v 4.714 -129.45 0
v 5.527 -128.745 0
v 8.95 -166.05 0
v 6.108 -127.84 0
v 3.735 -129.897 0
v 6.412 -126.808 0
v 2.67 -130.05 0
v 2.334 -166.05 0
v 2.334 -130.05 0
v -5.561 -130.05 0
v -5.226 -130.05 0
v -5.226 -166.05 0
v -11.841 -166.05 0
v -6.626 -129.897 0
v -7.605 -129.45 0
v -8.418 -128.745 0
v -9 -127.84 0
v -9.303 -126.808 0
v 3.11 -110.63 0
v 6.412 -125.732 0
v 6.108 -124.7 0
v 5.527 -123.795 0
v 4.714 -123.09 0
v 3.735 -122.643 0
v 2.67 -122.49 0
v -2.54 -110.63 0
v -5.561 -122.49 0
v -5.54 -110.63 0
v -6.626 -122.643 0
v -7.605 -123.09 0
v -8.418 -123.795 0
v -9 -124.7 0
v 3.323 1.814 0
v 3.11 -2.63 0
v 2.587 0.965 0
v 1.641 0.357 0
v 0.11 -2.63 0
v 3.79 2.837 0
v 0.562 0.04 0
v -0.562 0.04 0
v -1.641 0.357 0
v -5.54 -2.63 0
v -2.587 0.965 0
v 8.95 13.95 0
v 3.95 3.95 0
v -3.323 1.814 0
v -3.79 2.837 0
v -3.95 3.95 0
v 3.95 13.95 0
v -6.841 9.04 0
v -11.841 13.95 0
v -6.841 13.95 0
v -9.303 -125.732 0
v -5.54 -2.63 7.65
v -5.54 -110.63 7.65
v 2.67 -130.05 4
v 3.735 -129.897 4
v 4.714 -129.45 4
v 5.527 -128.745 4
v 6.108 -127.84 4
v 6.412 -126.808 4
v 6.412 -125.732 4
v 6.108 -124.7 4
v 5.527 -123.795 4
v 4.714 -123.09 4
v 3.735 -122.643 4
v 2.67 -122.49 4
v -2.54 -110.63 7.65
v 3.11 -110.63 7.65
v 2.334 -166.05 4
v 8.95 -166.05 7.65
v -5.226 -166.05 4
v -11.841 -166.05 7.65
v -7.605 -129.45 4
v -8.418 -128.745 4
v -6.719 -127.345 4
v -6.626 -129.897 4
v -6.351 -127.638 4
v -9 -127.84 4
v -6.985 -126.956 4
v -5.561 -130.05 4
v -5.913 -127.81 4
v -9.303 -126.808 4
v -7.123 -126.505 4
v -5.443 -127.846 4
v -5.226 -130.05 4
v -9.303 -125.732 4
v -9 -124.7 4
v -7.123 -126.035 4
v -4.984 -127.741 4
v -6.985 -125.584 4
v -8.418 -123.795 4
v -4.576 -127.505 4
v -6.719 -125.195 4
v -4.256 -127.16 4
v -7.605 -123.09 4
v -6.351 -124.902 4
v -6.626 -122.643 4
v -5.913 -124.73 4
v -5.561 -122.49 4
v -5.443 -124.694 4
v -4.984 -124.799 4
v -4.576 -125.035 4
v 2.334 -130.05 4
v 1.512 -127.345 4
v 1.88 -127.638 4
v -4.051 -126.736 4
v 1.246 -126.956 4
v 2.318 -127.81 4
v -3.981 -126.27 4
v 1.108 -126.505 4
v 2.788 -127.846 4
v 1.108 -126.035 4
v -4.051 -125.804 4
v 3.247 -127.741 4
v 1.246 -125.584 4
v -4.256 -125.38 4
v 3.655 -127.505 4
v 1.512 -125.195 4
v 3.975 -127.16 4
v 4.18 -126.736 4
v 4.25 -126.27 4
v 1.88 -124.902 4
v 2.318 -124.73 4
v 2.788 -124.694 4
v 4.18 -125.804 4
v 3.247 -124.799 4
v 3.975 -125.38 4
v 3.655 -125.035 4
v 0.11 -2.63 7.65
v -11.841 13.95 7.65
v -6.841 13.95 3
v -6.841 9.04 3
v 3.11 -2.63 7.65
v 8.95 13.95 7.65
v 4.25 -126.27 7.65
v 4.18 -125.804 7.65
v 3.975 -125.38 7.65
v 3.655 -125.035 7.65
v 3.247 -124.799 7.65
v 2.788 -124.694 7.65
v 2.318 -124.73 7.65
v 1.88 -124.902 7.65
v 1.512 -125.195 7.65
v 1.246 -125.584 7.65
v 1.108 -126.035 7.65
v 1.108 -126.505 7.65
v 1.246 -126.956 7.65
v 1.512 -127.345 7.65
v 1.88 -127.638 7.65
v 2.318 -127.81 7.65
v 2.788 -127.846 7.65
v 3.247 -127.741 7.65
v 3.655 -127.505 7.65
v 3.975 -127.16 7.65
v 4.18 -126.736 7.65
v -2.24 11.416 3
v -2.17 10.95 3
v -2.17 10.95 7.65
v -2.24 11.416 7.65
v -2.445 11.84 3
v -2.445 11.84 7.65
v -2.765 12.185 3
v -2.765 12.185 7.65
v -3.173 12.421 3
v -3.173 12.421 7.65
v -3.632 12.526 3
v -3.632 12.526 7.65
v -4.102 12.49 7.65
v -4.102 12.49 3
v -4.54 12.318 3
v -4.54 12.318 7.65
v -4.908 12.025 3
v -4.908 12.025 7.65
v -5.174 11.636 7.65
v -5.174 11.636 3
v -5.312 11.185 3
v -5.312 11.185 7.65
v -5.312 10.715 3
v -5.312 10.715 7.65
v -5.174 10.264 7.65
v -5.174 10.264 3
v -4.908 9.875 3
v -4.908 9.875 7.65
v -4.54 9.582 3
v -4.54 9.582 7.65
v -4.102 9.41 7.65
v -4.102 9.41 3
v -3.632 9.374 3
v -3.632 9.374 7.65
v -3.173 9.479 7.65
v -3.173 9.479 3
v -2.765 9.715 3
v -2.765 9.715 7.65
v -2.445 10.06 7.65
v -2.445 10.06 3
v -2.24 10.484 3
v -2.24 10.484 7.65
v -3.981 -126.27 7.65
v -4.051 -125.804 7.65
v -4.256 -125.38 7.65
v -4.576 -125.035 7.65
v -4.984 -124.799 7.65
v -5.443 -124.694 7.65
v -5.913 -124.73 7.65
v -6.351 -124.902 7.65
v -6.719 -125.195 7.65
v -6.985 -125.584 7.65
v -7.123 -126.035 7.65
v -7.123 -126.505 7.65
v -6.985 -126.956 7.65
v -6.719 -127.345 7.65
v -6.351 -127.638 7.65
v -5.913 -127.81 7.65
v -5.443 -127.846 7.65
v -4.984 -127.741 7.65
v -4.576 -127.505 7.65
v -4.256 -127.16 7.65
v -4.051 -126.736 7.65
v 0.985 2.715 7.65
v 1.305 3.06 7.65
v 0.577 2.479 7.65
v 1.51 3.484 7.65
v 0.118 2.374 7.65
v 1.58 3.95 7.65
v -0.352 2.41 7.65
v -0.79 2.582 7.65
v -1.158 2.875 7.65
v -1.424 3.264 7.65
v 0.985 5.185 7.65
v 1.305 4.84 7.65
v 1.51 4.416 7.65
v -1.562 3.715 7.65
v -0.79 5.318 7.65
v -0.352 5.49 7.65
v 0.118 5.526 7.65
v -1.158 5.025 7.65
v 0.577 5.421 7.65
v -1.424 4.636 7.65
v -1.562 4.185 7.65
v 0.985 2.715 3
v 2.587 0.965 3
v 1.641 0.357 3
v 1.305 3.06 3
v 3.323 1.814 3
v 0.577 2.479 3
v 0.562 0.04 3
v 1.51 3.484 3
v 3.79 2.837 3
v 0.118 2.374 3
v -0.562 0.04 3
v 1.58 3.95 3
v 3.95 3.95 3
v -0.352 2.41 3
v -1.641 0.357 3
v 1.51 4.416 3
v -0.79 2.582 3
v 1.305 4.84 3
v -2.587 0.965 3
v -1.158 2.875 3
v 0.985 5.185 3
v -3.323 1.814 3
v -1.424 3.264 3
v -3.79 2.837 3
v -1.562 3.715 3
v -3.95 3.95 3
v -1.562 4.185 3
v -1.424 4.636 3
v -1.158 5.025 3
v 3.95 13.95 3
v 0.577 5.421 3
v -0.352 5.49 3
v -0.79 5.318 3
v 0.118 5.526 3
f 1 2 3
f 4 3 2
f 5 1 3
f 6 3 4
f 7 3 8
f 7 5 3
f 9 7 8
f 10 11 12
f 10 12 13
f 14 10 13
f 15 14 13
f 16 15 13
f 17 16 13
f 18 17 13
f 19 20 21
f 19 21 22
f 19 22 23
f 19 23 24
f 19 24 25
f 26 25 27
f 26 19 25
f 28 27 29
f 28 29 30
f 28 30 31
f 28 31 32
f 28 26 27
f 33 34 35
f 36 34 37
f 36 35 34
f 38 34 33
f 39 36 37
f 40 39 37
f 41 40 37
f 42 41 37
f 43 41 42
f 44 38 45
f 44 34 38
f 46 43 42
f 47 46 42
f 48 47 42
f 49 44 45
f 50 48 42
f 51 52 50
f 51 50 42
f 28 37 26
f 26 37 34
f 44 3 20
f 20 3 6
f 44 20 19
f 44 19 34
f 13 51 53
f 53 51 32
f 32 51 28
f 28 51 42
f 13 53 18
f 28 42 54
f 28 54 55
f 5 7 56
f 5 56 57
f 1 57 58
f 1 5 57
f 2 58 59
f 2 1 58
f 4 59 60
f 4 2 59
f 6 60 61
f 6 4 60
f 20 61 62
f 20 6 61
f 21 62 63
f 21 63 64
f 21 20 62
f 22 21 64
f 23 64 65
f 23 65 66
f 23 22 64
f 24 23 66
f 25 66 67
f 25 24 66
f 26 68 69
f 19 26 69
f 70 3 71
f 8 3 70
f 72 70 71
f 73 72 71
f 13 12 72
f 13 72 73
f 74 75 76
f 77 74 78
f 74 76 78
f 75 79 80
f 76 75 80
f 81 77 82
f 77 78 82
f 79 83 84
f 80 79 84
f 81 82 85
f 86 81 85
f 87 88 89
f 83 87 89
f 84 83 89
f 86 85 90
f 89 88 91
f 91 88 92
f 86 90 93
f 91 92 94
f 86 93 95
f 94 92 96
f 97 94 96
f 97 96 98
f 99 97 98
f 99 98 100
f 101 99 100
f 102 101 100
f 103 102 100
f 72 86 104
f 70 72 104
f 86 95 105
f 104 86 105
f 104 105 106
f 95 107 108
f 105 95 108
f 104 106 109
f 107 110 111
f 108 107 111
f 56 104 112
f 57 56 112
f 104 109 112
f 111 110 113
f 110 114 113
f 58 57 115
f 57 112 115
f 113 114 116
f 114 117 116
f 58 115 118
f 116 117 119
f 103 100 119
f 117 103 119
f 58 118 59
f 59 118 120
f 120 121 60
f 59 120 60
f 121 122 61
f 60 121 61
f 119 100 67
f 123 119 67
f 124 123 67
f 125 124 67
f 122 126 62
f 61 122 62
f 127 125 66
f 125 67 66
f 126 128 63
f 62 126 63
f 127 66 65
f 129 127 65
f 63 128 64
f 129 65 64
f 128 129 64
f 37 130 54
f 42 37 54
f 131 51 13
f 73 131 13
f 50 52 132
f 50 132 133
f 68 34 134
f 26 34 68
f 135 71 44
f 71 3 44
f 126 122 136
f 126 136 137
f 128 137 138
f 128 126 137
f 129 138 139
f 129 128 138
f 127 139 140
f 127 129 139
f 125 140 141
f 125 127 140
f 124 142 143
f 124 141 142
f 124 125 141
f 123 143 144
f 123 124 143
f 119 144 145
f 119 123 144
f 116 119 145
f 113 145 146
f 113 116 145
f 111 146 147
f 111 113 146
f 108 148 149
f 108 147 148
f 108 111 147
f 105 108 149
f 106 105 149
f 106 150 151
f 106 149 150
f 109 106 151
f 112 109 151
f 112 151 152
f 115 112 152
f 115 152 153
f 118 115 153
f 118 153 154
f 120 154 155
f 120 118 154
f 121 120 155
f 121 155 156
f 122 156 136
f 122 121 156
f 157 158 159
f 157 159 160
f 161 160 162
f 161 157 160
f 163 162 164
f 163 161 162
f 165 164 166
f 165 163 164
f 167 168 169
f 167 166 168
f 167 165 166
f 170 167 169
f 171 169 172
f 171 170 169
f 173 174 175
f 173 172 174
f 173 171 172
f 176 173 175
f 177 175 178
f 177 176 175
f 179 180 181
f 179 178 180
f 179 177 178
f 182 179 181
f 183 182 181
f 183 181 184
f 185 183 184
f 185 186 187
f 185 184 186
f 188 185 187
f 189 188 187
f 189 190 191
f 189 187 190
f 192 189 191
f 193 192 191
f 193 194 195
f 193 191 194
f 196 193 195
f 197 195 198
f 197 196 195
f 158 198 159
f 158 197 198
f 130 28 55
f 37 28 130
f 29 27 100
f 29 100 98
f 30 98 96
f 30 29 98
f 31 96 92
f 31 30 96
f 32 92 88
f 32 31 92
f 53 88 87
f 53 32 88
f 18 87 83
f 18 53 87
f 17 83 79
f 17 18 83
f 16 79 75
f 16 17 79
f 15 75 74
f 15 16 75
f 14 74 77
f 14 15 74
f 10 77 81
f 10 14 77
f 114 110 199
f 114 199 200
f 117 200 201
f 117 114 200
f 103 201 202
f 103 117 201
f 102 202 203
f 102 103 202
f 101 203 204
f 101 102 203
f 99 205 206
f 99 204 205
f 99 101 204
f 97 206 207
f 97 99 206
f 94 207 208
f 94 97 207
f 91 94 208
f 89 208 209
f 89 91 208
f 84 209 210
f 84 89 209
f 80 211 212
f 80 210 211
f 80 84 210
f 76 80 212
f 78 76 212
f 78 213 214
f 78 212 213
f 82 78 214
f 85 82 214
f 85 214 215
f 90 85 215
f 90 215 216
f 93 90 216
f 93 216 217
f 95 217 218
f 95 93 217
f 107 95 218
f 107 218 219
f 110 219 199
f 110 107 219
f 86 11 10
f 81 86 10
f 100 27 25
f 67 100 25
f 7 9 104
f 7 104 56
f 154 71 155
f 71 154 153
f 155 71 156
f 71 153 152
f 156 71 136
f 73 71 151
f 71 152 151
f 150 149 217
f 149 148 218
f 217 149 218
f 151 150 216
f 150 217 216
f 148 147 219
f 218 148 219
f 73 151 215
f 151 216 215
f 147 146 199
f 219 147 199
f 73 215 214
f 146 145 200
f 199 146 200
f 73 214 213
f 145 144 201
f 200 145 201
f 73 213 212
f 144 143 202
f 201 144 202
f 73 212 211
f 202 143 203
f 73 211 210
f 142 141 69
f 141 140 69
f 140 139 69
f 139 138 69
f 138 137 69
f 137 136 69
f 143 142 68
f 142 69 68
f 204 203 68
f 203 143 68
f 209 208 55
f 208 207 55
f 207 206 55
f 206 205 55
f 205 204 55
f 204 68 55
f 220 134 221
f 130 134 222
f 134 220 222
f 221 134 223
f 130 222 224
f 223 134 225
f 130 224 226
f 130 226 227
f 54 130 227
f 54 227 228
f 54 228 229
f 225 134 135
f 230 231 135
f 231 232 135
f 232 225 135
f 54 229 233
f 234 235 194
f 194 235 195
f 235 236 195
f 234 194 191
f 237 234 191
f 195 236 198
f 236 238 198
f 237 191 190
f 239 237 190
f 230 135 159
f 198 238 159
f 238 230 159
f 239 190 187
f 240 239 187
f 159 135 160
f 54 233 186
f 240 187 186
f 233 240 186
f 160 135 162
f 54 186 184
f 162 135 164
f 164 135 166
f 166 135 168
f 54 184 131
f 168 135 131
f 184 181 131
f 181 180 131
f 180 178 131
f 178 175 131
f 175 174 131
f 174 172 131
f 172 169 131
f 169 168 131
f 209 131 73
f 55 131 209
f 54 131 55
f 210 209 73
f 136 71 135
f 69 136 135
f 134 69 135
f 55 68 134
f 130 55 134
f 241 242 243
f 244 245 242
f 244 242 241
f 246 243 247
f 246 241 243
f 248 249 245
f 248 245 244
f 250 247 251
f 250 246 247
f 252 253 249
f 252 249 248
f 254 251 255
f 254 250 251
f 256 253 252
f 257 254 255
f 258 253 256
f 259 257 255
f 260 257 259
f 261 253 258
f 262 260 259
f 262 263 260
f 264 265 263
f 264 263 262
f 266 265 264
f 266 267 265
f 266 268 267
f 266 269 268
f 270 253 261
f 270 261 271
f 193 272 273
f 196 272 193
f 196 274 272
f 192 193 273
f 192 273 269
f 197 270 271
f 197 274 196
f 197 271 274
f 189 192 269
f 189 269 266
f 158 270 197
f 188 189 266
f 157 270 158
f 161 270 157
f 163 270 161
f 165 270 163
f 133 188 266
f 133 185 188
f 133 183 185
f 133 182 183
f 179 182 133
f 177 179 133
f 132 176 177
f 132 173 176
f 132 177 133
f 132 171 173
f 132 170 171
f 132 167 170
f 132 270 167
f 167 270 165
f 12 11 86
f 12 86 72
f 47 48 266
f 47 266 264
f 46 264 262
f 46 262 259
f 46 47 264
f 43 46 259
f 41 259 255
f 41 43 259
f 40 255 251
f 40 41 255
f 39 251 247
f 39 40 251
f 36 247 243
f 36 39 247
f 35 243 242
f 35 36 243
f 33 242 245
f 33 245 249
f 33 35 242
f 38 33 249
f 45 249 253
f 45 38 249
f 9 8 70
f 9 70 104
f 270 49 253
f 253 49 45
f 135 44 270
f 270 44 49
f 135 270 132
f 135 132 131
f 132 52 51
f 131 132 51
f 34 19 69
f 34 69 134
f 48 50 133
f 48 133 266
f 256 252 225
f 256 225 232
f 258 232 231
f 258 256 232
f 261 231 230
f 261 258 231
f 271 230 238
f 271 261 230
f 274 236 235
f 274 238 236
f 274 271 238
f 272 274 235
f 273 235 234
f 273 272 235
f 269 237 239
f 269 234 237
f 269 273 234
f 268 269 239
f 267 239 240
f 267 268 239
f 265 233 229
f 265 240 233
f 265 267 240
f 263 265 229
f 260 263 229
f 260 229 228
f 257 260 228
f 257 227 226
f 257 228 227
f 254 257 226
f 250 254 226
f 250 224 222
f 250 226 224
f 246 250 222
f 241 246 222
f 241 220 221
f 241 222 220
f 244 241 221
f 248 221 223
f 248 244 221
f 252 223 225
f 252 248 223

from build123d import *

# Parameters (mm, degrees)
PAD_DEPTH            = 3
PAD001_DEPTH         = 4.65
SKETCH002_R          = 1.58
POCKET_DEPTH         = 0.001
POCKET_DEPTH_BACK    = -7.651
POCKET001_DEPTH      = 0.001
POCKET001_DEPTH_BACK = -7.651
POCKET002_DEPTH      = 4
SKETCH005_R          = 1.58
POCKET003_DEPTH      = 0.001
POCKET003_DEPTH_BACK = -7.651


with BuildPart() as part:
    # Sketch → Pad (new body)
    with BuildSketch(Plane.XY):
        with BuildLine():
            ThreePointArc((-3.95, 3.95), (0, 0), (3.95, 3.95))
            Line((3.95, 13.95), (3.95, 3.95))
            Line((3.95, 13.95), (8.95, 13.95))
            Line((8.95, 13.95), (8.95, 0))
            Line((8.95, 0), (8.95, -166.05))
            Line((8.95, -166.05), (-11.8411, -166.05))
            Line((-11.8411, -166.05), (-11.8411, 0))
            Line((-11.8411, 13.95), (-11.8411, 0))
            Line((-6.8411, 13.95), (-11.8411, 13.95))
            Line((-6.8411, 13.95), (-6.8411, 9.04))
            Line((-6.8411, 9.04), (-3.95, 3.95))
        make_face()
    extrude(amount=PAD_DEPTH)

    # Sketch001 → Pad001 (join)
    with BuildSketch(Plane.XY.offset(3)):
        Polygon((-11.8411, 0), (-11.8411, 13.95), (0, 13.95), (8.95, 13.95), (8.95, 0), (8.95, -166.05), (-11.8411, -166.05), align=None)
    extrude(amount=PAD001_DEPTH)

    # Sketch002 → Pocket (cut, two sides)
    with BuildSketch(Plane(origin=(0, 0.2, 0), x_dir=(1, 0, 0), z_dir=(0, 0, 1))) as pocket_sk:
        with Locations((0, 3.75)):
            Circle(SKETCH002_R)
        with Locations((-3.75, 10.75)):
            Circle(SKETCH002_R)
    extrude(amount=-POCKET_DEPTH, mode=Mode.SUBTRACT)
    extrude(pocket_sk.sketch, amount=-POCKET_DEPTH_BACK, mode=Mode.SUBTRACT)

    # Sketch003 → Pocket001 (cut, two sides)
    with BuildSketch(Plane.XY) as pocket001_sk:
        Polygon((0.11, -2.63), (-5.54, -2.63), (-5.54, -110.63), align=None)
        Polygon((-2.54, -110.63), (3.11, -110.63), (3.11, -2.63), align=None)
    extrude(amount=-POCKET001_DEPTH, mode=Mode.SUBTRACT)
    extrude(pocket001_sk.sketch, amount=-POCKET001_DEPTH_BACK, mode=Mode.SUBTRACT)

    # Sketch004 → Pocket002 (cut)
    with BuildSketch(Plane.XY):
        with BuildLine():
            Line((-5.22555, -130.05), (-5.22555, -166.05))
            Line((-5.22555, -166.05), (2.33445, -166.05))
            Line((2.33445, -166.05), (2.33445, -130.05))
            Line((2.33445, -130.05), (2.67, -130.05))
            ThreePointArc((2.67, -130.05), (6.45, -126.27), (2.67, -122.49))
            Line((-5.5611, -122.49), (2.67, -122.49))
            ThreePointArc((-5.5611, -122.49), (-9.3411, -126.27), (-5.5611, -130.05))
            Line((-5.22555, -130.05), (-5.5611, -130.05))
        make_face()
    extrude(amount=POCKET002_DEPTH, mode=Mode.SUBTRACT)

    # Sketch005 → Pocket003 (cut, two sides)
    with BuildSketch(Plane.XY) as pocket003_sk:
        with Locations((-5.5611, -126.27)):
            Circle(SKETCH005_R)
        with Locations((2.67, -126.27)):
            Circle(SKETCH005_R)
    extrude(amount=-POCKET003_DEPTH, mode=Mode.SUBTRACT)
    extrude(pocket003_sk.sketch, amount=-POCKET003_DEPTH_BACK, mode=Mode.SUBTRACT)


solid = part.part
